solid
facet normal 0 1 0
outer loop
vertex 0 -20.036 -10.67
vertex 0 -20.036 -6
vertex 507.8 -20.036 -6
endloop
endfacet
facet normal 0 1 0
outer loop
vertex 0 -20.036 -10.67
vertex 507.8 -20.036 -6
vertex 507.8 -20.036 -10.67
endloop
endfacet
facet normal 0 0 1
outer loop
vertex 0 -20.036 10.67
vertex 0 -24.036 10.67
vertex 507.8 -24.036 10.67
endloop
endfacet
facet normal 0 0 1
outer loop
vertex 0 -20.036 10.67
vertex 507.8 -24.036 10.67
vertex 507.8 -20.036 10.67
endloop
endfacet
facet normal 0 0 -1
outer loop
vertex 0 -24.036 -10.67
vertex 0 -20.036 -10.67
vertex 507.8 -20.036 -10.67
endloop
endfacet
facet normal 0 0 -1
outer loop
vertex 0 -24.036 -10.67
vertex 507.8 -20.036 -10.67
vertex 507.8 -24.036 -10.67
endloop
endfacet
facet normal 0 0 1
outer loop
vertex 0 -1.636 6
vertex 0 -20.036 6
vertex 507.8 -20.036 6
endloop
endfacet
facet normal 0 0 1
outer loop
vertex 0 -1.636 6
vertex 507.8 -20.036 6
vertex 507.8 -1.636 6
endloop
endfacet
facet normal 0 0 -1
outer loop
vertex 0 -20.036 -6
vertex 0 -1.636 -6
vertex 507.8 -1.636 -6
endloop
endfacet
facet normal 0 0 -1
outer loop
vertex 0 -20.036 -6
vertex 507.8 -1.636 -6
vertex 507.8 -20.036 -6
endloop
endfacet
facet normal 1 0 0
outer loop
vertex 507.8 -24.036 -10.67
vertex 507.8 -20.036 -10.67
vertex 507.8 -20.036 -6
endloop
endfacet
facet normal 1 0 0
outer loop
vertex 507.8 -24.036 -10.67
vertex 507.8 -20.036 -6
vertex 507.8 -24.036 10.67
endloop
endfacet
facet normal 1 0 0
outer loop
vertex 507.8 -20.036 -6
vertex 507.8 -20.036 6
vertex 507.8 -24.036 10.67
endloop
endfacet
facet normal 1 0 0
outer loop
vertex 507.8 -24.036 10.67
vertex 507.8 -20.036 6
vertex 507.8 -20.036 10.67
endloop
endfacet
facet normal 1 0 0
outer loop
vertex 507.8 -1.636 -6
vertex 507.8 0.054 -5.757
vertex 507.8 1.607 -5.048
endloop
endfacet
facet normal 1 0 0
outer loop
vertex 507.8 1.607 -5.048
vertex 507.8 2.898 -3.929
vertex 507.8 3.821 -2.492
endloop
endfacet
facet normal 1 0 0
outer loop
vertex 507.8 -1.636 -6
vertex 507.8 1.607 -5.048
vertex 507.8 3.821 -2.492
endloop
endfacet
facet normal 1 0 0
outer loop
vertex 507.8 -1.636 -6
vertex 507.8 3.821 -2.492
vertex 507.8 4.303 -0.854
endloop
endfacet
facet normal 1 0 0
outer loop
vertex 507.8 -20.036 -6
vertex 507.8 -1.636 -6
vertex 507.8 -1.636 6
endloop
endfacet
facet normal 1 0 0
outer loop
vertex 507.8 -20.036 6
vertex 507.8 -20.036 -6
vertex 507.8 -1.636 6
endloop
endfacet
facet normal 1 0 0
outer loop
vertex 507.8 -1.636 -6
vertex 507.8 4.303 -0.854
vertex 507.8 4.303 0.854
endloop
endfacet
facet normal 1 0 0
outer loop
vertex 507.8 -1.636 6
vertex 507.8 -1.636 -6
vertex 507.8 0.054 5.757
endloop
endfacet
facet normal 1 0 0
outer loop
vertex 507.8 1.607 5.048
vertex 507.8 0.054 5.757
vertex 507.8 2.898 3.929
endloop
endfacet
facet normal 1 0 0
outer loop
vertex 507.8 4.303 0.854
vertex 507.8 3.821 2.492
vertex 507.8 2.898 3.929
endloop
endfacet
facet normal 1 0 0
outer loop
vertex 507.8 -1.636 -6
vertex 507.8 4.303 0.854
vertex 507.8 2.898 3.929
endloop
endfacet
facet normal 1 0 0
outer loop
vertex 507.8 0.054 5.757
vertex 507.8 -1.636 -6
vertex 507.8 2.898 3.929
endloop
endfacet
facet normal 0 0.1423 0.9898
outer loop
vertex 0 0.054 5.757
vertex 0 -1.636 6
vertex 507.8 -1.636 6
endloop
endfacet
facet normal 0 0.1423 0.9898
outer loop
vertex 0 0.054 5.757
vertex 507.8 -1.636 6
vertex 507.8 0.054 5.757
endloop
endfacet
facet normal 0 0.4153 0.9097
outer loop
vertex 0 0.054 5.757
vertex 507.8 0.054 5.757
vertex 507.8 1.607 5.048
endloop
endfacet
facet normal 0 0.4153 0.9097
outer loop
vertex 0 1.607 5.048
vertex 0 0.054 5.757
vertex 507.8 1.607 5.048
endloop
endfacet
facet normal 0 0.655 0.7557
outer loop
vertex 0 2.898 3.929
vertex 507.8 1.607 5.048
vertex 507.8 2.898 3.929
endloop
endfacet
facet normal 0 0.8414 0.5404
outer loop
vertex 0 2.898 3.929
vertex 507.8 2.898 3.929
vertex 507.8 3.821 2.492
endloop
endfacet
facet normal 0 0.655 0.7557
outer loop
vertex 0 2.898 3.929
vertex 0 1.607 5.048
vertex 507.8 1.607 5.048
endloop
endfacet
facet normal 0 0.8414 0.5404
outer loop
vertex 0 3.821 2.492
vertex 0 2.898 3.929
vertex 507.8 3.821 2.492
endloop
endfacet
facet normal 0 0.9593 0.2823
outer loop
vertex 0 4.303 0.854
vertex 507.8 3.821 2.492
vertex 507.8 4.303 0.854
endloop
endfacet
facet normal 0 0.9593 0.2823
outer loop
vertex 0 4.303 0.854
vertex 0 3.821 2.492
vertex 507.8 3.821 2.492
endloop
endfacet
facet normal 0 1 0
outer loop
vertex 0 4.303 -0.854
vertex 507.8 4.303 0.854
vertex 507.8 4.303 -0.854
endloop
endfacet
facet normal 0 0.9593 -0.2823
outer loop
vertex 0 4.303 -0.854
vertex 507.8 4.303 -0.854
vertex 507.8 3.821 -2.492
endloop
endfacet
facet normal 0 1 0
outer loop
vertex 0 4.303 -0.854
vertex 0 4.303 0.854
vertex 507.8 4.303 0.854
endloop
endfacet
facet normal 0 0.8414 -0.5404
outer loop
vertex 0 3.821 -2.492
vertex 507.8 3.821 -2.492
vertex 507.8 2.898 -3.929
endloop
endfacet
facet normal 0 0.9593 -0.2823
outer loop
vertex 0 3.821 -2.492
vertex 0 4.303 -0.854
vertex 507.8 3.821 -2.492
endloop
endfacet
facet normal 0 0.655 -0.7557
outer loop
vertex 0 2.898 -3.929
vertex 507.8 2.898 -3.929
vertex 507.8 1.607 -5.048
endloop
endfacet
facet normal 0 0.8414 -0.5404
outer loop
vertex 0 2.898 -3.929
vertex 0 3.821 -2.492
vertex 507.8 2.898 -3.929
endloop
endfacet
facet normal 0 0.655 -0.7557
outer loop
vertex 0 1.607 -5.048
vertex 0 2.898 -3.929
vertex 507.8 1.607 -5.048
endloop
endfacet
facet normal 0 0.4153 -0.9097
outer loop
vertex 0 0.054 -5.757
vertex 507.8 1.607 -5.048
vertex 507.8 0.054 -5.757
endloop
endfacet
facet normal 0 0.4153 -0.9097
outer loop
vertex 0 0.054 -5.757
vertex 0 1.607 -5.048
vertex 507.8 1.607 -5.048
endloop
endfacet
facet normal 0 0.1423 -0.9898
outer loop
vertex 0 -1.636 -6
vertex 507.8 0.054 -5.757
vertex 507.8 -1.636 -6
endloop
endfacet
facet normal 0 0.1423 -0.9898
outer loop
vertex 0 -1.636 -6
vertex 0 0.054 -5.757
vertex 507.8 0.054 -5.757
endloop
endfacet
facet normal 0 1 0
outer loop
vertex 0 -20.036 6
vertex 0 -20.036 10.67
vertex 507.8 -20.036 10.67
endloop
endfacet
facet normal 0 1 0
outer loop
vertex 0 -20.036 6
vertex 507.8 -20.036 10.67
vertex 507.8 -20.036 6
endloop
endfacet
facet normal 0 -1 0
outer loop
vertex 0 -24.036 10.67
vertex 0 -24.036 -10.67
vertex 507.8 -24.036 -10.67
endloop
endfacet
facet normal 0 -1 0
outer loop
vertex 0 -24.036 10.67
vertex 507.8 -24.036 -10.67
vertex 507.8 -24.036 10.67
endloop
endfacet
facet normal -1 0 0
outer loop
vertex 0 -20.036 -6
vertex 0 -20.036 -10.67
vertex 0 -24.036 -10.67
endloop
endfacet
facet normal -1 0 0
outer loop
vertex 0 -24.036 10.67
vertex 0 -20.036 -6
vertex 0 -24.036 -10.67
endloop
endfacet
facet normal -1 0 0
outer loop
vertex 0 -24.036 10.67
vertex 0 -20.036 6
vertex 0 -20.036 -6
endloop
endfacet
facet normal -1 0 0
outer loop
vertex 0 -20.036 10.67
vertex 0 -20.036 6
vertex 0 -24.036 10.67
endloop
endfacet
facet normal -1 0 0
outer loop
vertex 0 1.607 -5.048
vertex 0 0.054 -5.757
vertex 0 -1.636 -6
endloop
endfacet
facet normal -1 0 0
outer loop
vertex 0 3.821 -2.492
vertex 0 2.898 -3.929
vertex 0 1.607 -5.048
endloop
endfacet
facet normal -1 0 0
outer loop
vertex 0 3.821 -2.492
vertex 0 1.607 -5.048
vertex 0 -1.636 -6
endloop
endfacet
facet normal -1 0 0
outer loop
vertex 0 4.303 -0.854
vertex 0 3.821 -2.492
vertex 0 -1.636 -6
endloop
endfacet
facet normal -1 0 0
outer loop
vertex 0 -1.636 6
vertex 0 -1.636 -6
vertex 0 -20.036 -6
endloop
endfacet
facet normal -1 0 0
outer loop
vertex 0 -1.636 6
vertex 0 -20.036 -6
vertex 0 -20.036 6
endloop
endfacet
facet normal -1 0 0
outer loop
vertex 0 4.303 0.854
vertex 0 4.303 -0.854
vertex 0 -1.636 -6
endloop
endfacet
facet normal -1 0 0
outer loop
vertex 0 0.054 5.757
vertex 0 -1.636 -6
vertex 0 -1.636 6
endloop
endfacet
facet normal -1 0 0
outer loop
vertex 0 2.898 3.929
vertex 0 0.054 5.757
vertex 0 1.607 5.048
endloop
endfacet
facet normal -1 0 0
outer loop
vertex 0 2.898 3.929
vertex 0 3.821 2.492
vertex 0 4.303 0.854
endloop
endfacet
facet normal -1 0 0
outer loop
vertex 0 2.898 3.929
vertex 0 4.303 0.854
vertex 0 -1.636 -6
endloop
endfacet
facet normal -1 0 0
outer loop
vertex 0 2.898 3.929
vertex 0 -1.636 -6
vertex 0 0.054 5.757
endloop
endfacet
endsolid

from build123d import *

# Parameters (mm, degrees)
BOSS_EXTRUDE1_DEPTH = 507.8


with BuildPart() as part:
    # Sketch2 → Boss-Extrude1 (new body)
    with BuildSketch(Plane(origin=(0, 0, 0), x_dir=(0, 0, -1), z_dir=(1, 0, 0))):
        with BuildLine():
            Line((6, -20.036364033), (10.669721768, -20.036364033))
            Line((10.669721768, -20.036364033), (10.669721768, -24.036364033))
            Line((10.669721768, -24.036364033), (-10.669721768, -24.036364033))
            Line((-10.669721768, -24.036364033), (-10.669721768, -20.036364033))
            Line((-10.669721768, -20.036364033), (-6, -20.036364033))
            Line((-6, -20.036364033), (-6, -1.636364033))
            ThreePointArc((-6, -1.636364033), (0, 4.363635967), (6, -1.636364033))
            Line((6, -1.636364033), (6, -20.036364033))
        make_face()
    extrude(amount=BOSS_EXTRUDE1_DEPTH)


solid = part.part
